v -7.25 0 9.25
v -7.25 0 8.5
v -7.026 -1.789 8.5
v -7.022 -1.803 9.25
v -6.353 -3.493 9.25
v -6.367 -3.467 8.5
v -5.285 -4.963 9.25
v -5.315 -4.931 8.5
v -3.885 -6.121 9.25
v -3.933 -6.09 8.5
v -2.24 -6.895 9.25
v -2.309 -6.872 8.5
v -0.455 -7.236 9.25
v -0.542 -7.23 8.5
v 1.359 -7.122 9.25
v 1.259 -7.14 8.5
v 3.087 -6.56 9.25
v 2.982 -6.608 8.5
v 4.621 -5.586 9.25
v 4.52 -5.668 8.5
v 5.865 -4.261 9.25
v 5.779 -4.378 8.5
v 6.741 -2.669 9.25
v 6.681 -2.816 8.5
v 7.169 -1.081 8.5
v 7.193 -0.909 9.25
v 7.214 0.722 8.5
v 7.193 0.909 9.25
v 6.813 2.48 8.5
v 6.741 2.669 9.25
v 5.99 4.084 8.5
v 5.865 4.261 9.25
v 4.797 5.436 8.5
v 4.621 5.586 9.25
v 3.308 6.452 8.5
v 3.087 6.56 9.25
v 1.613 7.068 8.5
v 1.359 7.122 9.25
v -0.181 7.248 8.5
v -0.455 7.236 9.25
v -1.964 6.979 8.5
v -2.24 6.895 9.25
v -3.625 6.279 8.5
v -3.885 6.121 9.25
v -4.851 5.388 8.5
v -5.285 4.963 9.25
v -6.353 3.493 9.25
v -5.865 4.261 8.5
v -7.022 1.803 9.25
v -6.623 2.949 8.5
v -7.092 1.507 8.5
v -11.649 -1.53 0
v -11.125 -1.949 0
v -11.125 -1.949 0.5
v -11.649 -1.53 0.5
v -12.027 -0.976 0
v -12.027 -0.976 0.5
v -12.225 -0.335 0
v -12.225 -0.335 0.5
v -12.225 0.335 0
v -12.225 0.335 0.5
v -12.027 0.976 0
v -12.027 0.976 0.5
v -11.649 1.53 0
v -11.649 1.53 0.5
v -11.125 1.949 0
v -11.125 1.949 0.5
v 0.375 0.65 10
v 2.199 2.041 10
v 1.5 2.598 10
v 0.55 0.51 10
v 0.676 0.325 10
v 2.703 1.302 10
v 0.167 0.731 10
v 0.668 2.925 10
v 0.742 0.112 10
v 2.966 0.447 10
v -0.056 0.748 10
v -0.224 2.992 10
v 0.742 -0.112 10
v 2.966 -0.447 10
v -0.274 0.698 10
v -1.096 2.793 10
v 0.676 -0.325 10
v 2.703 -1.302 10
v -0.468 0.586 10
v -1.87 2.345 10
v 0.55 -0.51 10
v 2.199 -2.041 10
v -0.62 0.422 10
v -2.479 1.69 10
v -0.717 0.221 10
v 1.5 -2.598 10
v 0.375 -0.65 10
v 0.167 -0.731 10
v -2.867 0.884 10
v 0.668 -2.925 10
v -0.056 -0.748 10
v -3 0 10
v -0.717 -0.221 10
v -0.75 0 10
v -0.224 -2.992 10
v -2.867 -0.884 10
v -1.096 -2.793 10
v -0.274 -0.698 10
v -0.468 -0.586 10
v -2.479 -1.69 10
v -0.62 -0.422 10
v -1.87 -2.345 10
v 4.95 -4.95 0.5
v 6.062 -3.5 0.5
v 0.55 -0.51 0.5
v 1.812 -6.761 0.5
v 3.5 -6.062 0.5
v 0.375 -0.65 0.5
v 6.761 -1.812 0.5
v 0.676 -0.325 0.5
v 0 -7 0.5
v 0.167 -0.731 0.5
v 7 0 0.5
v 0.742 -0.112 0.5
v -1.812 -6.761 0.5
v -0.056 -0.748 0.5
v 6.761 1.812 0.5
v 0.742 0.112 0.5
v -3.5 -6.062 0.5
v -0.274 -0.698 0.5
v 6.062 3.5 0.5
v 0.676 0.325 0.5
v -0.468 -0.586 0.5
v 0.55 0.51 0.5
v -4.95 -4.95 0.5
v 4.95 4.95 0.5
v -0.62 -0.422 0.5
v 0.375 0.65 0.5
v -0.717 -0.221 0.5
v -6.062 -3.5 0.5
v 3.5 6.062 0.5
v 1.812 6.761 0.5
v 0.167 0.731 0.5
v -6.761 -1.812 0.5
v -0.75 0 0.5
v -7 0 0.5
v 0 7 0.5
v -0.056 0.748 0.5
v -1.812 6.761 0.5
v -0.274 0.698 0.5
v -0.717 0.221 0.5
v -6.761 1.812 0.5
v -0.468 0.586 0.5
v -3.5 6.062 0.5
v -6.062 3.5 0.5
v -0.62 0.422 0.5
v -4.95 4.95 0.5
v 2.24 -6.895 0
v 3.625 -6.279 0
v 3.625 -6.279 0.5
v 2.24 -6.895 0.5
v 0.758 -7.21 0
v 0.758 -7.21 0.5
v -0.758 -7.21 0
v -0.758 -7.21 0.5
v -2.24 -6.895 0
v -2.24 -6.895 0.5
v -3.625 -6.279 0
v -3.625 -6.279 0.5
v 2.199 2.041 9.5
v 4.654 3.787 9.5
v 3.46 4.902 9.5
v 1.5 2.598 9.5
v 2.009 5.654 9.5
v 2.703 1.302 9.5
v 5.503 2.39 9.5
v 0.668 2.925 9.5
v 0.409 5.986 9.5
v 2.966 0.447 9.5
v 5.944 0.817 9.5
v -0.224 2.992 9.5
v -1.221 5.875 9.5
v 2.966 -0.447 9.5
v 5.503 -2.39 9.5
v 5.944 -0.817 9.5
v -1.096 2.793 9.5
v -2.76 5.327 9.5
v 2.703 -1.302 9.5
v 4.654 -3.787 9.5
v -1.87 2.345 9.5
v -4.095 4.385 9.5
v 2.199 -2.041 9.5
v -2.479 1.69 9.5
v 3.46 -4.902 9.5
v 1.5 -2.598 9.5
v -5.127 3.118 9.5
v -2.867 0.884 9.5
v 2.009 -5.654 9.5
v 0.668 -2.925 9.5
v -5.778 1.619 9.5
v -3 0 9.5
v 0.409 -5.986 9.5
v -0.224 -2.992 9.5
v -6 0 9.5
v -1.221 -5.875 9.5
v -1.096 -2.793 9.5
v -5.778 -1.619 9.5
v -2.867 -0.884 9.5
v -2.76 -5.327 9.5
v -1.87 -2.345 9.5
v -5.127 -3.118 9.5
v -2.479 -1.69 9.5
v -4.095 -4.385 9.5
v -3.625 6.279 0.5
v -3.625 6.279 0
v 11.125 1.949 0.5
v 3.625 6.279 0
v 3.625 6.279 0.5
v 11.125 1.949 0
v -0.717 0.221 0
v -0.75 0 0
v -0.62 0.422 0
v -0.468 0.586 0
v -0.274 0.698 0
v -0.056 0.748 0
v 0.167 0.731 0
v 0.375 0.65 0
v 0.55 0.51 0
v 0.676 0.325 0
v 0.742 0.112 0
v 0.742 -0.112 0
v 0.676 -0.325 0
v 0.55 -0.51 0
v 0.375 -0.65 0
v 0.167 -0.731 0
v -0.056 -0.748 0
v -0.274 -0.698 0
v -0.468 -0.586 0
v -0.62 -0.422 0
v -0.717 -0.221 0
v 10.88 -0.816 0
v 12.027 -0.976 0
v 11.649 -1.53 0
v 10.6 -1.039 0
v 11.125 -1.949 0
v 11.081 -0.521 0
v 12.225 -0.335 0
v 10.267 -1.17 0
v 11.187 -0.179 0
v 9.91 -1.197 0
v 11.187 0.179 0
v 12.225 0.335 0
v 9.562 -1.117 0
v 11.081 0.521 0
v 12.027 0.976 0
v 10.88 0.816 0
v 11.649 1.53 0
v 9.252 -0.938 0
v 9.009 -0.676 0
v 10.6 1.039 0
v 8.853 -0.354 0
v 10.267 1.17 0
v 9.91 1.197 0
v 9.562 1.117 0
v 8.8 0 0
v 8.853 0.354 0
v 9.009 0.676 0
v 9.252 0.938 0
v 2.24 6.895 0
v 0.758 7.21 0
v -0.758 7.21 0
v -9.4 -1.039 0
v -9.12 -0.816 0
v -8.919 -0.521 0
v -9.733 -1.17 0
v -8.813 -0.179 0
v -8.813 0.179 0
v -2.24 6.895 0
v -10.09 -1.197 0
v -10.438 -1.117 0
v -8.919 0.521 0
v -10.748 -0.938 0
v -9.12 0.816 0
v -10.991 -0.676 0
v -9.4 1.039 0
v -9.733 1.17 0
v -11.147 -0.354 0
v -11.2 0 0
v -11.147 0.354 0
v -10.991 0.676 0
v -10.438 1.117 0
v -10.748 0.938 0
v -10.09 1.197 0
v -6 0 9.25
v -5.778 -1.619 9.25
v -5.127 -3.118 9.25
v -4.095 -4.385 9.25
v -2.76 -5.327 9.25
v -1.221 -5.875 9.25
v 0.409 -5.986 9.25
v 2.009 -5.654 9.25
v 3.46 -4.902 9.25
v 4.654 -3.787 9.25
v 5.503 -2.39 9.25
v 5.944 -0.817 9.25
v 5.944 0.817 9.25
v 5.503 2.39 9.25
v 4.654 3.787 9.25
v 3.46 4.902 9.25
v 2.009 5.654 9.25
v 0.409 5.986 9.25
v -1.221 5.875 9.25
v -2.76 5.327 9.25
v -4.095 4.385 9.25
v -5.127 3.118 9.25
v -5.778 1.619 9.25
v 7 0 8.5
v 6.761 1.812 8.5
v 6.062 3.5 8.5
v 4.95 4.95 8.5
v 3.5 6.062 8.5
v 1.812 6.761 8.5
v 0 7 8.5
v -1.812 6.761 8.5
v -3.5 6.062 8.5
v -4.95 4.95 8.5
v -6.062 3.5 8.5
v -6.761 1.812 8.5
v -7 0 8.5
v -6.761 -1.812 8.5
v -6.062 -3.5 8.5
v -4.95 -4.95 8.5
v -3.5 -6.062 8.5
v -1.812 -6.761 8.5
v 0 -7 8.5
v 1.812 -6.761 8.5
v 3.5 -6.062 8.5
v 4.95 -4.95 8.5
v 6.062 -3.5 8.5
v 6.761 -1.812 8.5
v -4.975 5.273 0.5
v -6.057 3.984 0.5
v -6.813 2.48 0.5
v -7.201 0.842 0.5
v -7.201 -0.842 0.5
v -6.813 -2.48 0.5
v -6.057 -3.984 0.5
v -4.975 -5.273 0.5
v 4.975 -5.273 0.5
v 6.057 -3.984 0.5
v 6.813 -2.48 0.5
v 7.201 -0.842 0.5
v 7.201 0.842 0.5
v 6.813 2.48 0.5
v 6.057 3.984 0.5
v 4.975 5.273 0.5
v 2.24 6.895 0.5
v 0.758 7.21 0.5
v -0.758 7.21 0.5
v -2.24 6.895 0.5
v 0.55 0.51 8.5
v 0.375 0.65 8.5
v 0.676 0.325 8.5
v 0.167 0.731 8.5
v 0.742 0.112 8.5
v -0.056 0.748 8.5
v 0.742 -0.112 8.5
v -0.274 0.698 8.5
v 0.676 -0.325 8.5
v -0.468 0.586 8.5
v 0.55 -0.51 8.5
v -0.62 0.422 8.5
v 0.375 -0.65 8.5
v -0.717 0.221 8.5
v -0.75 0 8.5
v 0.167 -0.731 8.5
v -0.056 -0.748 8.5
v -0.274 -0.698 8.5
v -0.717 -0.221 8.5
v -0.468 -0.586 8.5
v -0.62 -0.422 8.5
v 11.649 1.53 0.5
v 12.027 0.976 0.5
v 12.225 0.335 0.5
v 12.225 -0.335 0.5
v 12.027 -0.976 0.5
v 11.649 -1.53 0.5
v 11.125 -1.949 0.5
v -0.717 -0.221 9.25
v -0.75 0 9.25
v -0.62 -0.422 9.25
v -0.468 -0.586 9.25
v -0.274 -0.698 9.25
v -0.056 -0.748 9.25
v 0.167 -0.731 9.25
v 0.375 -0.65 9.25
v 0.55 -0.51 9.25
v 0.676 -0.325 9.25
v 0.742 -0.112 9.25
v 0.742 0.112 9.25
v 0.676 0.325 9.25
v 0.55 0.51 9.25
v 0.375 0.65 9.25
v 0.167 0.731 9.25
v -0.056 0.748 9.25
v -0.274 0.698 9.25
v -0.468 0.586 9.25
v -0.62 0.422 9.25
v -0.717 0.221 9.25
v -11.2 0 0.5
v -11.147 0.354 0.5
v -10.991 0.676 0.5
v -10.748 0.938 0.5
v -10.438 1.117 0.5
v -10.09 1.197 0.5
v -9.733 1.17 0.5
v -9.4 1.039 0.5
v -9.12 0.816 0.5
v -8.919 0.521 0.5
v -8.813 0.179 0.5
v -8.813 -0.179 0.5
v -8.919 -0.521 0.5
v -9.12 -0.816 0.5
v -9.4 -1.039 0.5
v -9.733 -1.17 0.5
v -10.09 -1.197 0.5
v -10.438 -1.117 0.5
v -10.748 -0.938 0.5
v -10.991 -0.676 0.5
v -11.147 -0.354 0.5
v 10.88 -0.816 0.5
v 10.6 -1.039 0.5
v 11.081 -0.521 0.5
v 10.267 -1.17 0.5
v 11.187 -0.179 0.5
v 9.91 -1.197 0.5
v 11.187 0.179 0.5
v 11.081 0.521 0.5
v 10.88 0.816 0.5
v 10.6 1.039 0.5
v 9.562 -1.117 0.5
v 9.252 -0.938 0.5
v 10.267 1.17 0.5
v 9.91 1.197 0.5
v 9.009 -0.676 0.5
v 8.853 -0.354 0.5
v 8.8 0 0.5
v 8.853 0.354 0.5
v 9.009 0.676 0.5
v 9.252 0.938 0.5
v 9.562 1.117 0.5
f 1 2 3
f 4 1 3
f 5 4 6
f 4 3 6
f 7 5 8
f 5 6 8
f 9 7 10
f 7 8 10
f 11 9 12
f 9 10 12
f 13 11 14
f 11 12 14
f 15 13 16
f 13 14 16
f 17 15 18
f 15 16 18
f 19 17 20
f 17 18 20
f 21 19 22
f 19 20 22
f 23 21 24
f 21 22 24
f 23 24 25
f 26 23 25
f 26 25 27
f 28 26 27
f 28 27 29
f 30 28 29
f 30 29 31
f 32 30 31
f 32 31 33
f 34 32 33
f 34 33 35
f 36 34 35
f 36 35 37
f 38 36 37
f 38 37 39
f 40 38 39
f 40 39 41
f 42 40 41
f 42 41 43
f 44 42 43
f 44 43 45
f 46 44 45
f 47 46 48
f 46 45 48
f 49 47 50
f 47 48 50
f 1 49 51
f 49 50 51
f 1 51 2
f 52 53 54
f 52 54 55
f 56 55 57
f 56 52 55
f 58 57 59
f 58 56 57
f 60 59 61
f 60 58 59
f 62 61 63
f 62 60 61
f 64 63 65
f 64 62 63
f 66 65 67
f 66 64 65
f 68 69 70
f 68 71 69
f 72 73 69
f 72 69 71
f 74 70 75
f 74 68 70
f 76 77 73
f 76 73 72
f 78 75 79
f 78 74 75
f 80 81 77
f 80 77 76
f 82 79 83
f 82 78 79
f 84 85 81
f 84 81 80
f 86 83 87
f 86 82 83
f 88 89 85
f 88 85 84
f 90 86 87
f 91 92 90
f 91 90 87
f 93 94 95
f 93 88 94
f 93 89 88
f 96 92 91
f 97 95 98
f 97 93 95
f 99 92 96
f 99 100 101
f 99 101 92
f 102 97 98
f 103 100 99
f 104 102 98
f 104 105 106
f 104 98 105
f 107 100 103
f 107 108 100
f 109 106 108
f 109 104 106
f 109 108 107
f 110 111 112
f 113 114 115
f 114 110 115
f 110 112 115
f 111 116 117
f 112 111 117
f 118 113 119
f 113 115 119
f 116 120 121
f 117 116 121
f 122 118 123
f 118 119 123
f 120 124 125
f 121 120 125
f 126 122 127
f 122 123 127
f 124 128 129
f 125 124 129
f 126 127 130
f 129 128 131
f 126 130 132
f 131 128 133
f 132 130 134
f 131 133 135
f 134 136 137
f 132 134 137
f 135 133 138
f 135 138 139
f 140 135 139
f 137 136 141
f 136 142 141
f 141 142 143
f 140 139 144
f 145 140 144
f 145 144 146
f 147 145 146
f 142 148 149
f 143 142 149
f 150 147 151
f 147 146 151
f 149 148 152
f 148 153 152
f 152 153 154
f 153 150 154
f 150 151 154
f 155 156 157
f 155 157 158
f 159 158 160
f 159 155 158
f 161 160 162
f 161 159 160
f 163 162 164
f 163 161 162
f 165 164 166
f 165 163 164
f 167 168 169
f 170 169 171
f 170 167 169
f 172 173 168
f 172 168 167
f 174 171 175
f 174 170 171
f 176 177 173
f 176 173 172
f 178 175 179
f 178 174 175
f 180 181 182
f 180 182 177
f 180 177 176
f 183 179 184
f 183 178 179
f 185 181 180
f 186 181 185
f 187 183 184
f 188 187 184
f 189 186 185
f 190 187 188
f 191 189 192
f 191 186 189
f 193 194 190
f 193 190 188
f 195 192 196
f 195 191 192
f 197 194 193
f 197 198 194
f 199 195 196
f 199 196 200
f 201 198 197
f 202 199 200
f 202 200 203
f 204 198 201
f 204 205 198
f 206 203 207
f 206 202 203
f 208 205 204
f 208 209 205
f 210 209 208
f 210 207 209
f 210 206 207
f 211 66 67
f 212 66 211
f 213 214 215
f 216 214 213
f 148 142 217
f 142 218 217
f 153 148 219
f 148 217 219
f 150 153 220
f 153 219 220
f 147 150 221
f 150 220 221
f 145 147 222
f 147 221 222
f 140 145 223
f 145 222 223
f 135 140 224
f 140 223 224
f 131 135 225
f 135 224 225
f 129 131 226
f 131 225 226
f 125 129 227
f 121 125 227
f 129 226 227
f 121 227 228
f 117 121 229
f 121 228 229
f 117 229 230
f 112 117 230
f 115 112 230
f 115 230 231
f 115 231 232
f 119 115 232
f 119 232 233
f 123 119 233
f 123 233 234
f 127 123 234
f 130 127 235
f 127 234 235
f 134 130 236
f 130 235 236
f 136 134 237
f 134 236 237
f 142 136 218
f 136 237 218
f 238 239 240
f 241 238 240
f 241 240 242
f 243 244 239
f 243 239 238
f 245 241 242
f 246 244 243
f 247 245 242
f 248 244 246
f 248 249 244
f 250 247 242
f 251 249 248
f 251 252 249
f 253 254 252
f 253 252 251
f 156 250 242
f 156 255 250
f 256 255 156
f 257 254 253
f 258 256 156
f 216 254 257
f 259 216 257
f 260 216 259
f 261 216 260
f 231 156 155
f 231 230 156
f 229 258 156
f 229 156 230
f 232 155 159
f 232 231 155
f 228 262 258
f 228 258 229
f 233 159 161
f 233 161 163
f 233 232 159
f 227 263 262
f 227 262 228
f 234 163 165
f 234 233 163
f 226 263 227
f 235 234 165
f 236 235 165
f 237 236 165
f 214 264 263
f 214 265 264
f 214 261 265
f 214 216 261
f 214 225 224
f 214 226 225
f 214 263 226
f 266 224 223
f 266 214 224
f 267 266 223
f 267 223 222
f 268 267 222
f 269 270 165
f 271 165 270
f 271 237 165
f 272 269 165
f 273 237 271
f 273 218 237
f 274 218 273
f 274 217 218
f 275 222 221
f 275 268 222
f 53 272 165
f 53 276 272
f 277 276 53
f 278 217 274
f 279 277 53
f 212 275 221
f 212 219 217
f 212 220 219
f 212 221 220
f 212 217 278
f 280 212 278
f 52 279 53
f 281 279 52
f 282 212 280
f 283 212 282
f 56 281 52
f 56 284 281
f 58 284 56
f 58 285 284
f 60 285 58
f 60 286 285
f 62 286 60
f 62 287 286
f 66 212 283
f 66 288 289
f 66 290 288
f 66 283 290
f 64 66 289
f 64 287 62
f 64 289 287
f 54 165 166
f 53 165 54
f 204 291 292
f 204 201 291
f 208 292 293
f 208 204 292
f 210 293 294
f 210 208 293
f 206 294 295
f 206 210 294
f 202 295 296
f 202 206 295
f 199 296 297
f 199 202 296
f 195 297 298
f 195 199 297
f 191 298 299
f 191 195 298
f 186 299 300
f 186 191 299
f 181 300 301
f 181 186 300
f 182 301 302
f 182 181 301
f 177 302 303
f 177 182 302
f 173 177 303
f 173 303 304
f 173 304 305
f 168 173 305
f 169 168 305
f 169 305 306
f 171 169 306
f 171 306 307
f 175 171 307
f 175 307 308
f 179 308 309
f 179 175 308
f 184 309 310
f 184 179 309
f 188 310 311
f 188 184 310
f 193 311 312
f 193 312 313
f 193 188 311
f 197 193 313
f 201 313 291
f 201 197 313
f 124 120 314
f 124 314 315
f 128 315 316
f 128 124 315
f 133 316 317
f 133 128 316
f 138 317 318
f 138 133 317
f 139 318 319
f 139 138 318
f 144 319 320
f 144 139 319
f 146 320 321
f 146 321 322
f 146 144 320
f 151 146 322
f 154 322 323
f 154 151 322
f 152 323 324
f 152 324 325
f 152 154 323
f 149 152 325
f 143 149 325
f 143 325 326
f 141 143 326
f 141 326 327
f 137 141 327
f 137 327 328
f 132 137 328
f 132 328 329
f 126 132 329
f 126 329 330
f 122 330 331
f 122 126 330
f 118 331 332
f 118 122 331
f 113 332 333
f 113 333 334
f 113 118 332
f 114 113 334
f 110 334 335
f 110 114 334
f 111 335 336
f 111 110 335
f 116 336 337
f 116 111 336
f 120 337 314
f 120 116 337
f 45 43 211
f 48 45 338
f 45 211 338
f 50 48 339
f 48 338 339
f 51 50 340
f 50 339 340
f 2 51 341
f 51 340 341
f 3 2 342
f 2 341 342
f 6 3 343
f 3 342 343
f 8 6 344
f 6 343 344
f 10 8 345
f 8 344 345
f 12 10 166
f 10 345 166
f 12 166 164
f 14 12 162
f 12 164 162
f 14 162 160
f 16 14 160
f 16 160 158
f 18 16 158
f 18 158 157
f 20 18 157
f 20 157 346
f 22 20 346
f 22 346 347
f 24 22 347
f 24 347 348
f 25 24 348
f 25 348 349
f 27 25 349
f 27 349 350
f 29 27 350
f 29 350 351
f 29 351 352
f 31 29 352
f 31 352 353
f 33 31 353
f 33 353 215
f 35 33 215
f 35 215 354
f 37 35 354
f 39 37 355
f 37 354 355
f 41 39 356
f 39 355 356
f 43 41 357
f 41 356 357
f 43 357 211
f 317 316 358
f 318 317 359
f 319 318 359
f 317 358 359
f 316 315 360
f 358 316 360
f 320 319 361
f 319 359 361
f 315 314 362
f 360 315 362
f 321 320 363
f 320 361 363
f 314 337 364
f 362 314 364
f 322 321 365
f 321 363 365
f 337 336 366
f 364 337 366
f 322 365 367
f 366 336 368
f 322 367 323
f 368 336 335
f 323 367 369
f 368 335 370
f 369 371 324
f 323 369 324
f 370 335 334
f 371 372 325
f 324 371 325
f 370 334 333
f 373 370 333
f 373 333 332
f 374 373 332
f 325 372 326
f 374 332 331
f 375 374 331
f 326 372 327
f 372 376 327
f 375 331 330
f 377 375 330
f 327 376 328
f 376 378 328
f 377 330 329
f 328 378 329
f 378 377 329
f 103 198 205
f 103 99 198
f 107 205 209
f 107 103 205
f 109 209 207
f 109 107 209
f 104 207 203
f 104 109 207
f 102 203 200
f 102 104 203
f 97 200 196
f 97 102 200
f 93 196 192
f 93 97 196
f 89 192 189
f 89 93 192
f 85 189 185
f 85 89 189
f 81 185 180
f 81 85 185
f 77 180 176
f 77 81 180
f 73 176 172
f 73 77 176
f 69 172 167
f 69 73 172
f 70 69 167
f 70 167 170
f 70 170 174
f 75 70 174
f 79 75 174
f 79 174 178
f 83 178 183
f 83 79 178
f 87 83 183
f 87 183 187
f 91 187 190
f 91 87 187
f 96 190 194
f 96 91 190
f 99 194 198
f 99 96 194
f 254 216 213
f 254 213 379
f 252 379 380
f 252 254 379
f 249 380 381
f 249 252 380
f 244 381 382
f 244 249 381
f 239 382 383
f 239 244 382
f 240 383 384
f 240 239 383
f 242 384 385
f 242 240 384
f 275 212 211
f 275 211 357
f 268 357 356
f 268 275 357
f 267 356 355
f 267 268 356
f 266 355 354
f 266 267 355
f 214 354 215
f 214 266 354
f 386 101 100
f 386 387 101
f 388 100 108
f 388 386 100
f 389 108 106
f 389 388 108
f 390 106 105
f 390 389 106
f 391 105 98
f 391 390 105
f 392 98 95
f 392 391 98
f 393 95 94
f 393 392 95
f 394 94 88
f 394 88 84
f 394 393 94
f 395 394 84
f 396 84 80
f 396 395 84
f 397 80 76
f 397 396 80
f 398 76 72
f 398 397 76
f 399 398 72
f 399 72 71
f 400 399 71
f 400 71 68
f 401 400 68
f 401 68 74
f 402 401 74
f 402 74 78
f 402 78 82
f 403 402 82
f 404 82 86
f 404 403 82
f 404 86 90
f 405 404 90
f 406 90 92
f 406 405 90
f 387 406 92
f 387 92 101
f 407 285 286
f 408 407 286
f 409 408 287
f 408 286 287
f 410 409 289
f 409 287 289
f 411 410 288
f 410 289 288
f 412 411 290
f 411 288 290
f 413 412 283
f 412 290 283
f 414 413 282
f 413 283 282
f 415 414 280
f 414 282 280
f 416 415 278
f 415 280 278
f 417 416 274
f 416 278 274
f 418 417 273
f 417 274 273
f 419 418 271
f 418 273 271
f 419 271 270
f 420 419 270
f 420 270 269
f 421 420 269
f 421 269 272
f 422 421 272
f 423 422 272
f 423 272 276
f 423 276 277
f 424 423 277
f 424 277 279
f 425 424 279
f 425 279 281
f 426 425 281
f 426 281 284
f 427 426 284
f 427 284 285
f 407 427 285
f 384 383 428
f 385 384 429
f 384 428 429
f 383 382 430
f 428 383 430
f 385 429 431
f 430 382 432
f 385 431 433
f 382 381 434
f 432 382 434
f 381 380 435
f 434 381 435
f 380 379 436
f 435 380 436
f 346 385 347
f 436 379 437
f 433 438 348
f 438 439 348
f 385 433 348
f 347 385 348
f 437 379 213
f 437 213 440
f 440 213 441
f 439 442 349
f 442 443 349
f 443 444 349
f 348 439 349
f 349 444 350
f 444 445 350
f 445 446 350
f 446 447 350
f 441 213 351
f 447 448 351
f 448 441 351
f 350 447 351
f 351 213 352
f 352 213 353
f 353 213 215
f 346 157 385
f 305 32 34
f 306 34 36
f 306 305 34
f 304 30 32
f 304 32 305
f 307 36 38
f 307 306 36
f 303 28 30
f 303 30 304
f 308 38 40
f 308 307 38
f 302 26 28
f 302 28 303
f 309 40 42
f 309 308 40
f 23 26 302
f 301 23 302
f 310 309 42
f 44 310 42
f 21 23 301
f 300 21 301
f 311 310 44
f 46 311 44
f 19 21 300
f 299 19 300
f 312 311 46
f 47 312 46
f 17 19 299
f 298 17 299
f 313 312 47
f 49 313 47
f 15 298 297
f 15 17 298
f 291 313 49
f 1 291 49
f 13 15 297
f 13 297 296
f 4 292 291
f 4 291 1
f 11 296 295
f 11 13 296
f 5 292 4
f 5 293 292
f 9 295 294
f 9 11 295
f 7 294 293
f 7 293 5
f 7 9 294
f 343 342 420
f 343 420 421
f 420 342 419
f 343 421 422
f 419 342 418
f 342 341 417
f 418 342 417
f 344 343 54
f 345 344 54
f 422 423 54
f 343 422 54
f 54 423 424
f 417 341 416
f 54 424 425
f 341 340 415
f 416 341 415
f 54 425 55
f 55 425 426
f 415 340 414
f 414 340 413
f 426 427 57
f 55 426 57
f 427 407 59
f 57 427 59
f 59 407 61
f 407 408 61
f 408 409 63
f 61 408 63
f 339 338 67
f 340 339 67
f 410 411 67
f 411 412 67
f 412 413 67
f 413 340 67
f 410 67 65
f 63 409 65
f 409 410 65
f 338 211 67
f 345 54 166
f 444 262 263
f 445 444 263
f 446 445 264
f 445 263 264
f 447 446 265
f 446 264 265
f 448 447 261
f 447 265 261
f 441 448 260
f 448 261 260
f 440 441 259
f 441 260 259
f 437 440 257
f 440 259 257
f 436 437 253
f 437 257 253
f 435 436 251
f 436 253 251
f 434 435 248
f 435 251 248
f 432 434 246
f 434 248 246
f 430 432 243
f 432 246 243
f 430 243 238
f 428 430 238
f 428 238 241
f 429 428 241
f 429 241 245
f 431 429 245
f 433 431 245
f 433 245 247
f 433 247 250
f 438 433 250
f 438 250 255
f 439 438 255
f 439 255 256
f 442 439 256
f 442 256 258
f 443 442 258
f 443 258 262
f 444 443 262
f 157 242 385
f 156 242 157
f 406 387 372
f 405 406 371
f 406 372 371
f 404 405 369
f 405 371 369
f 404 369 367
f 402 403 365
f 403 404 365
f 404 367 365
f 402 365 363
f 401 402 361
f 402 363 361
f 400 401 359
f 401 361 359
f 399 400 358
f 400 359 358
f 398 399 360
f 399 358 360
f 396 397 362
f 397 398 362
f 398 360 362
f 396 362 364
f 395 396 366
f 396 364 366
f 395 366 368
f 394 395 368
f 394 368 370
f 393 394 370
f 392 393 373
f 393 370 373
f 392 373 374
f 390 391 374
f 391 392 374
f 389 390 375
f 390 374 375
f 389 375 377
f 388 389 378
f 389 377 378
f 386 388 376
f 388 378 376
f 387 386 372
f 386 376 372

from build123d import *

# Parameters (mm, degrees)
BOSS_EXTRU_1_DEPTH      = 0.5
ESQUISSE2_R             = 7.25
ESQUISSE2_R_2           = 7
BOSS_EXTRU_2_DEPTH      = 8
D_GAGEMENT_M21_D        = 2.4
D_GAGEMENT_M21_DEPTH    = 10
D_GAGEMENT_M21_TIP      = 0.721032743
ESQUISSE16_R            = 7.25
BOSS_EXTRU_4_DEPTH      = 0.75
ESQUISSE7_R             = 0.75
ENL_V_MAT_EXTRU_1_DEPTH = 18.396120257


with BuildPart() as part:
    # Esquisse1 → Boss.-Extru.1 (new body)
    with BuildSketch(Plane.XY):
        with BuildLine():
            Line((-11.125, 1.948557159), (-3.625, 6.278684177))
            ThreePointArc((-3.625, 6.278684177), (0, 7.25), (3.625, 6.278684177))
            Line((3.625, 6.278684177), (11.125, 1.948557159))
            ThreePointArc((11.125, 1.948557159), (12.25, 0), (11.125, -1.948557159))
            Line((11.125, -1.948557159), (3.625, -6.278684177))
            ThreePointArc((3.625, -6.278684177), (0, -7.25), (-3.625, -6.278684177))
            Line((-3.625, -6.278684177), (-11.125, -1.948557159))
            ThreePointArc((-11.125, -1.948557159), (-12.25, 0), (-11.125, 1.948557159))
        make_face()
    extrude(amount=BOSS_EXTRU_1_DEPTH)

    # Esquisse2 → Boss.-Extru.2 (add)
    with BuildSketch(Plane.XY.offset(0.5)):
        with Locations(Location((0, 0, 0), (0, 0, 120))):
            Circle(ESQUISSE2_R)
        Circle(ESQUISSE2_R_2, mode=Mode.SUBTRACT)
    extrude(amount=BOSS_EXTRU_2_DEPTH)

    # Dégagement M21
    with Locations(Plane(origin=(-10, 0, 0.5), x_dir=(1, 0, 0), z_dir=(0, 0, 1))):
        with Locations((0, 0), (20, 0)):
            Hole(D_GAGEMENT_M21_D / 2, depth=D_GAGEMENT_M21_DEPTH)
            with Locations((0, 0, -(D_GAGEMENT_M21_DEPTH + D_GAGEMENT_M21_TIP / 2))):  # 118° drill point
                Cone(0, D_GAGEMENT_M21_D / 2, D_GAGEMENT_M21_TIP, mode=Mode.SUBTRACT)



with BuildPart() as body_2:
    # Esquisse5 → Révolution1 (revolve)
    with BuildSketch(Plane(origin=(0, 0, 0), x_dir=(1, 0, 0), z_dir=(0, 1, 0))):
        Polygon((-6, -9.25), (-6, -9.5), (-3, -9.5), (-3, -10), (-0.75, -10), (-0.75, -9.25), align=None)
    revolve(axis=Axis((0, 0, 0), (0, 0, 1)))


with BuildPart() as part_1:
    add(part.part)

    add(body_2.part)  # Boss.-Extru.4 merges body 2
    # Esquisse16 → Boss.-Extru.4 (add)
    with BuildSketch(Plane.XY.offset(8.5)):
        with Locations(Location((0, 0, 0), (0, 0, 180))):
            Circle(ESQUISSE16_R)
    extrude(amount=BOSS_EXTRU_4_DEPTH)

    # Esquisse7 → Enlèv. mat.-Extru.1 (cut, through all)
    with BuildSketch(Plane(origin=(0, 0, 0), x_dir=(-1, 0, 0), z_dir=(0, 0, -1))):
        Circle(ESQUISSE7_R)
    extrude(amount=-ENL_V_MAT_EXTRU_1_DEPTH, mode=Mode.SUBTRACT)


solid = part_1.part
